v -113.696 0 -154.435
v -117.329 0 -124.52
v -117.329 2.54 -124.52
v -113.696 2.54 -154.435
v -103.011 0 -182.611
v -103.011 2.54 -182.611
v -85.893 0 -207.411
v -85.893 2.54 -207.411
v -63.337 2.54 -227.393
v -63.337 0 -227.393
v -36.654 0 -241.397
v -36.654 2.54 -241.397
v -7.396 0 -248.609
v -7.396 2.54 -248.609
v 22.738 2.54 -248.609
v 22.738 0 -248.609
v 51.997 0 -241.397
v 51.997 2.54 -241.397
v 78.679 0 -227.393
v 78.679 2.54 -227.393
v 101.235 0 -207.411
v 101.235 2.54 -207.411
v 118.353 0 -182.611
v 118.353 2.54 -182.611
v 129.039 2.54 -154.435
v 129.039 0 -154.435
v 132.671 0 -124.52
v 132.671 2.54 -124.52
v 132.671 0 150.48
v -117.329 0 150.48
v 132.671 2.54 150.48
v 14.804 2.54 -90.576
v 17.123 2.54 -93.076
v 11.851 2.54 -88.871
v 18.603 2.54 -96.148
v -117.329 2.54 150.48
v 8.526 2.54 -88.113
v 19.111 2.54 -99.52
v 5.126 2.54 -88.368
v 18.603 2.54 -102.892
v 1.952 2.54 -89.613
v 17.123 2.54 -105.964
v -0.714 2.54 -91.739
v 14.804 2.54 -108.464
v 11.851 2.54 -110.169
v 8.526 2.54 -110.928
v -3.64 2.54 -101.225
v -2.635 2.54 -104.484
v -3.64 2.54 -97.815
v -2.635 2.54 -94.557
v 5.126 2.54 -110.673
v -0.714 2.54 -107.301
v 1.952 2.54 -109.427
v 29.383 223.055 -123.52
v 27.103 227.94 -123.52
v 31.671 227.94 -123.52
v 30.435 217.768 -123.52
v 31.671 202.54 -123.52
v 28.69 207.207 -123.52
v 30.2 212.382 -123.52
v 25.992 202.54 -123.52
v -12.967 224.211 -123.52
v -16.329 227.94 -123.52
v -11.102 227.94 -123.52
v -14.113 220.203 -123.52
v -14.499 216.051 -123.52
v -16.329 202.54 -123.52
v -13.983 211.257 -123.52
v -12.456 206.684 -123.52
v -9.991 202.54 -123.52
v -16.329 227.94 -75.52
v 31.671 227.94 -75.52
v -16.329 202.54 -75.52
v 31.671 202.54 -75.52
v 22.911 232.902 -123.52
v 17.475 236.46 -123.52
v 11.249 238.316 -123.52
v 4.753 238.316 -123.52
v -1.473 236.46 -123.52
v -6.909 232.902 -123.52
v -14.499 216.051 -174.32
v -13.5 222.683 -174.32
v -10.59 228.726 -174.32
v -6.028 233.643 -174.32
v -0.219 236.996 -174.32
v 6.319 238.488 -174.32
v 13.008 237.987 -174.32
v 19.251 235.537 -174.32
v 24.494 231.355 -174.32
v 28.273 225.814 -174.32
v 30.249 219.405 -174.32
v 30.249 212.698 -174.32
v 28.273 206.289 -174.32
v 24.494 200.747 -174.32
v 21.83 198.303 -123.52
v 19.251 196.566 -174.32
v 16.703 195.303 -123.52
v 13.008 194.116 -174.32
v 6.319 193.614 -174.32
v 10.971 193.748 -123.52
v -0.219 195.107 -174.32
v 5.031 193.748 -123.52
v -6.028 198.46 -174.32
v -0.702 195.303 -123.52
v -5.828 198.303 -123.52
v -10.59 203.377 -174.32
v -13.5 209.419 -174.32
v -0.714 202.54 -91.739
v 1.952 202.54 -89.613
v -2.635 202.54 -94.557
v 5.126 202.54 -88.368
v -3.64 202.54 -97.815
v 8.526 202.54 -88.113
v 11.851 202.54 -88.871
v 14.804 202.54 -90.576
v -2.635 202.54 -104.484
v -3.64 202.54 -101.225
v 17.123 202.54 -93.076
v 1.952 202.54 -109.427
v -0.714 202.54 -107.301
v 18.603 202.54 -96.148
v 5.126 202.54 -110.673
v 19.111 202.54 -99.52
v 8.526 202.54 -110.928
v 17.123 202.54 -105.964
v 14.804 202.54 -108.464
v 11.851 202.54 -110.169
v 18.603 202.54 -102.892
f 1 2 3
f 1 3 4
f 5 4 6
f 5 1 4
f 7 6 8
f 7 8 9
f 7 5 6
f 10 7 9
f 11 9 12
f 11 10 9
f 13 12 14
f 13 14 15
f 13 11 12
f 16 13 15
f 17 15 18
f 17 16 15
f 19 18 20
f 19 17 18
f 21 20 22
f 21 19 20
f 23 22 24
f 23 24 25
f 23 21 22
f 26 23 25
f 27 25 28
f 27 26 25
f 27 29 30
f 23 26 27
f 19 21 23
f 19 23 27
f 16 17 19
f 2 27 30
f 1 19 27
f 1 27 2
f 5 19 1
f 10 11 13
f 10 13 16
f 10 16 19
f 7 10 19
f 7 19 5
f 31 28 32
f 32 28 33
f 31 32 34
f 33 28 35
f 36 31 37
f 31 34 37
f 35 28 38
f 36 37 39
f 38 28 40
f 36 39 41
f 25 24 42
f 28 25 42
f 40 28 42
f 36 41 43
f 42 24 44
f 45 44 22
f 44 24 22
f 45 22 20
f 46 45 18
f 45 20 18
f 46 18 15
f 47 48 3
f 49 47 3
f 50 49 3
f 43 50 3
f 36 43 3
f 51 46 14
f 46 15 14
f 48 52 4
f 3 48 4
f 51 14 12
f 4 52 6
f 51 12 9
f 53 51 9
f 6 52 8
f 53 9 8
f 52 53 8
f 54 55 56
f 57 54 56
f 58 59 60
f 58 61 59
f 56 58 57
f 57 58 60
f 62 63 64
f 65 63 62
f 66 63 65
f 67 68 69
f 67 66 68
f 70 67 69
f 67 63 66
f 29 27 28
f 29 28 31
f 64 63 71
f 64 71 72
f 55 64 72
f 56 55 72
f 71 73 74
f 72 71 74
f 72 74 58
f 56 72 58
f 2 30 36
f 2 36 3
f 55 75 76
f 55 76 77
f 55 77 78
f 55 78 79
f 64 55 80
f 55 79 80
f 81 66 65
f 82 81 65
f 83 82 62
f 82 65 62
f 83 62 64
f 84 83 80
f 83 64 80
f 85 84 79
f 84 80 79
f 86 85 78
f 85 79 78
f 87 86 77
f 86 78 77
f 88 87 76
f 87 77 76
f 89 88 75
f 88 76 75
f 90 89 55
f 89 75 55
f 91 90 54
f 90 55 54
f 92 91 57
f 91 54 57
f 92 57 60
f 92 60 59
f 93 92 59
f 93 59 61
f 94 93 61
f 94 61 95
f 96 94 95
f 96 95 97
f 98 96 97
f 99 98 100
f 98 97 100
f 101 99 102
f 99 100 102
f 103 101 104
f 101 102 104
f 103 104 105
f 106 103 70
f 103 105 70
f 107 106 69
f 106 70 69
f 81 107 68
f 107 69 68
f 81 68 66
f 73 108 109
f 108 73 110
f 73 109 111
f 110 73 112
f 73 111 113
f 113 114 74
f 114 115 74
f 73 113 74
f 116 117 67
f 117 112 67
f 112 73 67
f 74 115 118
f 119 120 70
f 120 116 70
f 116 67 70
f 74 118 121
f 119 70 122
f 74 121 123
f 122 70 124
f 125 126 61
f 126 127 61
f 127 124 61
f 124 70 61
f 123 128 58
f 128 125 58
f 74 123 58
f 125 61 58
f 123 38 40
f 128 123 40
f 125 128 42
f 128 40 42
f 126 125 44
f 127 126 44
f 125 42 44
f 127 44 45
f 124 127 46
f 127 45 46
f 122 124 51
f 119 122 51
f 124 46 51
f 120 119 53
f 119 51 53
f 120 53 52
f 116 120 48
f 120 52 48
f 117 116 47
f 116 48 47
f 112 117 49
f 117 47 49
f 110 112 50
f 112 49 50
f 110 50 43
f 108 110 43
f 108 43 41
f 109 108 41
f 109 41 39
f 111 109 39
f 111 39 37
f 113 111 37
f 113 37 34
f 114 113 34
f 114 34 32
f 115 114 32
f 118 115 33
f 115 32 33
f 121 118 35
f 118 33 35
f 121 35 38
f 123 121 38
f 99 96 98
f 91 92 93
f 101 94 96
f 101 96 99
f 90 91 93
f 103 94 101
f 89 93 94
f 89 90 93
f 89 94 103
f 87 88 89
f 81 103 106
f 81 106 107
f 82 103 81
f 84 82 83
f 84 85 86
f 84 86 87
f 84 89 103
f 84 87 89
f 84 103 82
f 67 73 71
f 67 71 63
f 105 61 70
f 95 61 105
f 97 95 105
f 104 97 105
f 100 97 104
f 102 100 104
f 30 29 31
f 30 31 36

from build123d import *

# Parameters (mm, degrees)
BOSS_EXTRUDE1_DEPTH = 2.54
SKETCH2_R           = 11.439475367
BOSS_EXTRUDE2_DEPTH = 200
SKETCH3_W           = 48.000000012
SKETCH3_H           = 48.000000012
BOSS_EXTRUDE3_DEPTH = 25.4
SKETCH4_R           = 22.499999958
BOSS_EXTRUDE4_DEPTH = 50.8


with BuildPart() as part:
    # Sketch1 → Boss-Extrude1 (new body)
    with BuildSketch(Plane(origin=(0, 0, 0), x_dir=(1, 0, 0), z_dir=(0, 1, 0))):
        with BuildLine():
            Line((132.671256636, -150.479823869), (-117.328743364, -150.479823869))
            Line((-117.328743364, -150.479823869), (-117.328743364, 124.520176131))
            ThreePointArc((-117.328743364, 124.520176131), (7.671256636, 249.520176131), (132.671256636, 124.520176131))
            Line((132.671256636, 124.520176131), (132.671256636, -150.479823869))
        make_face()
    extrude(amount=BOSS_EXTRUDE1_DEPTH)

    # Sketch2 → Boss-Extrude2 (add)
    with BuildSketch(Plane(origin=(0, 2.54, 0), x_dir=(1, 0, 0), z_dir=(0, 1, 0))):
        with Locations((7.671256636, 99.520176157)):
            Circle(SKETCH2_R)
    extrude(amount=BOSS_EXTRUDE2_DEPTH)

    # Sketch3 → Boss-Extrude3 (add)
    with BuildSketch(Plane(origin=(0, 202.54, 0), x_dir=(1, 0, 0), z_dir=(0, 1, 0))):
        with Locations((7.671256636, 99.520176157)):
            Rectangle(SKETCH3_W, SKETCH3_H)
    extrude(amount=BOSS_EXTRUDE3_DEPTH)

    # Sketch4 → Boss-Extrude4 (add)
    with BuildSketch(Plane(origin=(0, 0, -123.520176163), x_dir=(-1, 0, 0), z_dir=(0, 0, -1))):
        with Locations((-8.000795549, 216.051385612)):
            Circle(SKETCH4_R)
    extrude(amount=BOSS_EXTRUDE4_DEPTH)


solid = part.part
